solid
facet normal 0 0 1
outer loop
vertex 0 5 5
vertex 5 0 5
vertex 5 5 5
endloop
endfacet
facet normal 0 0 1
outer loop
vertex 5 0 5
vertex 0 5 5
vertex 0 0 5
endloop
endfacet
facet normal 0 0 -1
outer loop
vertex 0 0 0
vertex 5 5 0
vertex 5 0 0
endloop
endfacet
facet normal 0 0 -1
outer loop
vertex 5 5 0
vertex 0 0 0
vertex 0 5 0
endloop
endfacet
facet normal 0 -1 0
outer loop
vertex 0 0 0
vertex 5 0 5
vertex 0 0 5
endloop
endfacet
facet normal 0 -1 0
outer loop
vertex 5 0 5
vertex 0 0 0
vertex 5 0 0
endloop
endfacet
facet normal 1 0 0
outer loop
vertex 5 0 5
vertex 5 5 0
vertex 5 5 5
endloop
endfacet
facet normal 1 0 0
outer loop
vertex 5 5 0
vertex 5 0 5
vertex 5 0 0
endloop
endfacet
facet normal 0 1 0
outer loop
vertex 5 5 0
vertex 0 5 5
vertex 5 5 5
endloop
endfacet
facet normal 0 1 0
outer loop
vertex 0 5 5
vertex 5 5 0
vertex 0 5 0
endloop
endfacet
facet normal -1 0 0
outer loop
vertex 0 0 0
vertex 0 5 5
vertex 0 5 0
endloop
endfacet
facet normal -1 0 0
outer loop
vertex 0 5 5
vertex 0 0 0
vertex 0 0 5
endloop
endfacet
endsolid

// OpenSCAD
/*
 * OpenSCAD Workshop Examples
 * Copyright (c) 2013 Anar Software LLC. < http://anars.com >
 *
 * This program is free software: you can redistribute it and/or modify it under
 * the terms of the GNU General Public License as published by the Free Software
 * Foundation, either version 3 of the License, or (at your option) any later
 * version.
 *
 * This program is distributed in the hope that it will be useful, but WITHOUT
 * ANY WARRANTY; without even the implied warranty of MERCHANTABILITY or FITNESS
 * FOR A PARTICULAR PURPOSE. See the GNU General Public License for more details.
 *
 * You should have received a copy of the GNU General Public License along with
 * this program. If not, see < http://www.gnu.org/licenses/ >
 *
 */
/*

Creates a cube in the first octant.
The argument names are optional if the arguments are given in the same order as specified in the parameters.

Parameters :

	cube(x);

*/

cube(5);
